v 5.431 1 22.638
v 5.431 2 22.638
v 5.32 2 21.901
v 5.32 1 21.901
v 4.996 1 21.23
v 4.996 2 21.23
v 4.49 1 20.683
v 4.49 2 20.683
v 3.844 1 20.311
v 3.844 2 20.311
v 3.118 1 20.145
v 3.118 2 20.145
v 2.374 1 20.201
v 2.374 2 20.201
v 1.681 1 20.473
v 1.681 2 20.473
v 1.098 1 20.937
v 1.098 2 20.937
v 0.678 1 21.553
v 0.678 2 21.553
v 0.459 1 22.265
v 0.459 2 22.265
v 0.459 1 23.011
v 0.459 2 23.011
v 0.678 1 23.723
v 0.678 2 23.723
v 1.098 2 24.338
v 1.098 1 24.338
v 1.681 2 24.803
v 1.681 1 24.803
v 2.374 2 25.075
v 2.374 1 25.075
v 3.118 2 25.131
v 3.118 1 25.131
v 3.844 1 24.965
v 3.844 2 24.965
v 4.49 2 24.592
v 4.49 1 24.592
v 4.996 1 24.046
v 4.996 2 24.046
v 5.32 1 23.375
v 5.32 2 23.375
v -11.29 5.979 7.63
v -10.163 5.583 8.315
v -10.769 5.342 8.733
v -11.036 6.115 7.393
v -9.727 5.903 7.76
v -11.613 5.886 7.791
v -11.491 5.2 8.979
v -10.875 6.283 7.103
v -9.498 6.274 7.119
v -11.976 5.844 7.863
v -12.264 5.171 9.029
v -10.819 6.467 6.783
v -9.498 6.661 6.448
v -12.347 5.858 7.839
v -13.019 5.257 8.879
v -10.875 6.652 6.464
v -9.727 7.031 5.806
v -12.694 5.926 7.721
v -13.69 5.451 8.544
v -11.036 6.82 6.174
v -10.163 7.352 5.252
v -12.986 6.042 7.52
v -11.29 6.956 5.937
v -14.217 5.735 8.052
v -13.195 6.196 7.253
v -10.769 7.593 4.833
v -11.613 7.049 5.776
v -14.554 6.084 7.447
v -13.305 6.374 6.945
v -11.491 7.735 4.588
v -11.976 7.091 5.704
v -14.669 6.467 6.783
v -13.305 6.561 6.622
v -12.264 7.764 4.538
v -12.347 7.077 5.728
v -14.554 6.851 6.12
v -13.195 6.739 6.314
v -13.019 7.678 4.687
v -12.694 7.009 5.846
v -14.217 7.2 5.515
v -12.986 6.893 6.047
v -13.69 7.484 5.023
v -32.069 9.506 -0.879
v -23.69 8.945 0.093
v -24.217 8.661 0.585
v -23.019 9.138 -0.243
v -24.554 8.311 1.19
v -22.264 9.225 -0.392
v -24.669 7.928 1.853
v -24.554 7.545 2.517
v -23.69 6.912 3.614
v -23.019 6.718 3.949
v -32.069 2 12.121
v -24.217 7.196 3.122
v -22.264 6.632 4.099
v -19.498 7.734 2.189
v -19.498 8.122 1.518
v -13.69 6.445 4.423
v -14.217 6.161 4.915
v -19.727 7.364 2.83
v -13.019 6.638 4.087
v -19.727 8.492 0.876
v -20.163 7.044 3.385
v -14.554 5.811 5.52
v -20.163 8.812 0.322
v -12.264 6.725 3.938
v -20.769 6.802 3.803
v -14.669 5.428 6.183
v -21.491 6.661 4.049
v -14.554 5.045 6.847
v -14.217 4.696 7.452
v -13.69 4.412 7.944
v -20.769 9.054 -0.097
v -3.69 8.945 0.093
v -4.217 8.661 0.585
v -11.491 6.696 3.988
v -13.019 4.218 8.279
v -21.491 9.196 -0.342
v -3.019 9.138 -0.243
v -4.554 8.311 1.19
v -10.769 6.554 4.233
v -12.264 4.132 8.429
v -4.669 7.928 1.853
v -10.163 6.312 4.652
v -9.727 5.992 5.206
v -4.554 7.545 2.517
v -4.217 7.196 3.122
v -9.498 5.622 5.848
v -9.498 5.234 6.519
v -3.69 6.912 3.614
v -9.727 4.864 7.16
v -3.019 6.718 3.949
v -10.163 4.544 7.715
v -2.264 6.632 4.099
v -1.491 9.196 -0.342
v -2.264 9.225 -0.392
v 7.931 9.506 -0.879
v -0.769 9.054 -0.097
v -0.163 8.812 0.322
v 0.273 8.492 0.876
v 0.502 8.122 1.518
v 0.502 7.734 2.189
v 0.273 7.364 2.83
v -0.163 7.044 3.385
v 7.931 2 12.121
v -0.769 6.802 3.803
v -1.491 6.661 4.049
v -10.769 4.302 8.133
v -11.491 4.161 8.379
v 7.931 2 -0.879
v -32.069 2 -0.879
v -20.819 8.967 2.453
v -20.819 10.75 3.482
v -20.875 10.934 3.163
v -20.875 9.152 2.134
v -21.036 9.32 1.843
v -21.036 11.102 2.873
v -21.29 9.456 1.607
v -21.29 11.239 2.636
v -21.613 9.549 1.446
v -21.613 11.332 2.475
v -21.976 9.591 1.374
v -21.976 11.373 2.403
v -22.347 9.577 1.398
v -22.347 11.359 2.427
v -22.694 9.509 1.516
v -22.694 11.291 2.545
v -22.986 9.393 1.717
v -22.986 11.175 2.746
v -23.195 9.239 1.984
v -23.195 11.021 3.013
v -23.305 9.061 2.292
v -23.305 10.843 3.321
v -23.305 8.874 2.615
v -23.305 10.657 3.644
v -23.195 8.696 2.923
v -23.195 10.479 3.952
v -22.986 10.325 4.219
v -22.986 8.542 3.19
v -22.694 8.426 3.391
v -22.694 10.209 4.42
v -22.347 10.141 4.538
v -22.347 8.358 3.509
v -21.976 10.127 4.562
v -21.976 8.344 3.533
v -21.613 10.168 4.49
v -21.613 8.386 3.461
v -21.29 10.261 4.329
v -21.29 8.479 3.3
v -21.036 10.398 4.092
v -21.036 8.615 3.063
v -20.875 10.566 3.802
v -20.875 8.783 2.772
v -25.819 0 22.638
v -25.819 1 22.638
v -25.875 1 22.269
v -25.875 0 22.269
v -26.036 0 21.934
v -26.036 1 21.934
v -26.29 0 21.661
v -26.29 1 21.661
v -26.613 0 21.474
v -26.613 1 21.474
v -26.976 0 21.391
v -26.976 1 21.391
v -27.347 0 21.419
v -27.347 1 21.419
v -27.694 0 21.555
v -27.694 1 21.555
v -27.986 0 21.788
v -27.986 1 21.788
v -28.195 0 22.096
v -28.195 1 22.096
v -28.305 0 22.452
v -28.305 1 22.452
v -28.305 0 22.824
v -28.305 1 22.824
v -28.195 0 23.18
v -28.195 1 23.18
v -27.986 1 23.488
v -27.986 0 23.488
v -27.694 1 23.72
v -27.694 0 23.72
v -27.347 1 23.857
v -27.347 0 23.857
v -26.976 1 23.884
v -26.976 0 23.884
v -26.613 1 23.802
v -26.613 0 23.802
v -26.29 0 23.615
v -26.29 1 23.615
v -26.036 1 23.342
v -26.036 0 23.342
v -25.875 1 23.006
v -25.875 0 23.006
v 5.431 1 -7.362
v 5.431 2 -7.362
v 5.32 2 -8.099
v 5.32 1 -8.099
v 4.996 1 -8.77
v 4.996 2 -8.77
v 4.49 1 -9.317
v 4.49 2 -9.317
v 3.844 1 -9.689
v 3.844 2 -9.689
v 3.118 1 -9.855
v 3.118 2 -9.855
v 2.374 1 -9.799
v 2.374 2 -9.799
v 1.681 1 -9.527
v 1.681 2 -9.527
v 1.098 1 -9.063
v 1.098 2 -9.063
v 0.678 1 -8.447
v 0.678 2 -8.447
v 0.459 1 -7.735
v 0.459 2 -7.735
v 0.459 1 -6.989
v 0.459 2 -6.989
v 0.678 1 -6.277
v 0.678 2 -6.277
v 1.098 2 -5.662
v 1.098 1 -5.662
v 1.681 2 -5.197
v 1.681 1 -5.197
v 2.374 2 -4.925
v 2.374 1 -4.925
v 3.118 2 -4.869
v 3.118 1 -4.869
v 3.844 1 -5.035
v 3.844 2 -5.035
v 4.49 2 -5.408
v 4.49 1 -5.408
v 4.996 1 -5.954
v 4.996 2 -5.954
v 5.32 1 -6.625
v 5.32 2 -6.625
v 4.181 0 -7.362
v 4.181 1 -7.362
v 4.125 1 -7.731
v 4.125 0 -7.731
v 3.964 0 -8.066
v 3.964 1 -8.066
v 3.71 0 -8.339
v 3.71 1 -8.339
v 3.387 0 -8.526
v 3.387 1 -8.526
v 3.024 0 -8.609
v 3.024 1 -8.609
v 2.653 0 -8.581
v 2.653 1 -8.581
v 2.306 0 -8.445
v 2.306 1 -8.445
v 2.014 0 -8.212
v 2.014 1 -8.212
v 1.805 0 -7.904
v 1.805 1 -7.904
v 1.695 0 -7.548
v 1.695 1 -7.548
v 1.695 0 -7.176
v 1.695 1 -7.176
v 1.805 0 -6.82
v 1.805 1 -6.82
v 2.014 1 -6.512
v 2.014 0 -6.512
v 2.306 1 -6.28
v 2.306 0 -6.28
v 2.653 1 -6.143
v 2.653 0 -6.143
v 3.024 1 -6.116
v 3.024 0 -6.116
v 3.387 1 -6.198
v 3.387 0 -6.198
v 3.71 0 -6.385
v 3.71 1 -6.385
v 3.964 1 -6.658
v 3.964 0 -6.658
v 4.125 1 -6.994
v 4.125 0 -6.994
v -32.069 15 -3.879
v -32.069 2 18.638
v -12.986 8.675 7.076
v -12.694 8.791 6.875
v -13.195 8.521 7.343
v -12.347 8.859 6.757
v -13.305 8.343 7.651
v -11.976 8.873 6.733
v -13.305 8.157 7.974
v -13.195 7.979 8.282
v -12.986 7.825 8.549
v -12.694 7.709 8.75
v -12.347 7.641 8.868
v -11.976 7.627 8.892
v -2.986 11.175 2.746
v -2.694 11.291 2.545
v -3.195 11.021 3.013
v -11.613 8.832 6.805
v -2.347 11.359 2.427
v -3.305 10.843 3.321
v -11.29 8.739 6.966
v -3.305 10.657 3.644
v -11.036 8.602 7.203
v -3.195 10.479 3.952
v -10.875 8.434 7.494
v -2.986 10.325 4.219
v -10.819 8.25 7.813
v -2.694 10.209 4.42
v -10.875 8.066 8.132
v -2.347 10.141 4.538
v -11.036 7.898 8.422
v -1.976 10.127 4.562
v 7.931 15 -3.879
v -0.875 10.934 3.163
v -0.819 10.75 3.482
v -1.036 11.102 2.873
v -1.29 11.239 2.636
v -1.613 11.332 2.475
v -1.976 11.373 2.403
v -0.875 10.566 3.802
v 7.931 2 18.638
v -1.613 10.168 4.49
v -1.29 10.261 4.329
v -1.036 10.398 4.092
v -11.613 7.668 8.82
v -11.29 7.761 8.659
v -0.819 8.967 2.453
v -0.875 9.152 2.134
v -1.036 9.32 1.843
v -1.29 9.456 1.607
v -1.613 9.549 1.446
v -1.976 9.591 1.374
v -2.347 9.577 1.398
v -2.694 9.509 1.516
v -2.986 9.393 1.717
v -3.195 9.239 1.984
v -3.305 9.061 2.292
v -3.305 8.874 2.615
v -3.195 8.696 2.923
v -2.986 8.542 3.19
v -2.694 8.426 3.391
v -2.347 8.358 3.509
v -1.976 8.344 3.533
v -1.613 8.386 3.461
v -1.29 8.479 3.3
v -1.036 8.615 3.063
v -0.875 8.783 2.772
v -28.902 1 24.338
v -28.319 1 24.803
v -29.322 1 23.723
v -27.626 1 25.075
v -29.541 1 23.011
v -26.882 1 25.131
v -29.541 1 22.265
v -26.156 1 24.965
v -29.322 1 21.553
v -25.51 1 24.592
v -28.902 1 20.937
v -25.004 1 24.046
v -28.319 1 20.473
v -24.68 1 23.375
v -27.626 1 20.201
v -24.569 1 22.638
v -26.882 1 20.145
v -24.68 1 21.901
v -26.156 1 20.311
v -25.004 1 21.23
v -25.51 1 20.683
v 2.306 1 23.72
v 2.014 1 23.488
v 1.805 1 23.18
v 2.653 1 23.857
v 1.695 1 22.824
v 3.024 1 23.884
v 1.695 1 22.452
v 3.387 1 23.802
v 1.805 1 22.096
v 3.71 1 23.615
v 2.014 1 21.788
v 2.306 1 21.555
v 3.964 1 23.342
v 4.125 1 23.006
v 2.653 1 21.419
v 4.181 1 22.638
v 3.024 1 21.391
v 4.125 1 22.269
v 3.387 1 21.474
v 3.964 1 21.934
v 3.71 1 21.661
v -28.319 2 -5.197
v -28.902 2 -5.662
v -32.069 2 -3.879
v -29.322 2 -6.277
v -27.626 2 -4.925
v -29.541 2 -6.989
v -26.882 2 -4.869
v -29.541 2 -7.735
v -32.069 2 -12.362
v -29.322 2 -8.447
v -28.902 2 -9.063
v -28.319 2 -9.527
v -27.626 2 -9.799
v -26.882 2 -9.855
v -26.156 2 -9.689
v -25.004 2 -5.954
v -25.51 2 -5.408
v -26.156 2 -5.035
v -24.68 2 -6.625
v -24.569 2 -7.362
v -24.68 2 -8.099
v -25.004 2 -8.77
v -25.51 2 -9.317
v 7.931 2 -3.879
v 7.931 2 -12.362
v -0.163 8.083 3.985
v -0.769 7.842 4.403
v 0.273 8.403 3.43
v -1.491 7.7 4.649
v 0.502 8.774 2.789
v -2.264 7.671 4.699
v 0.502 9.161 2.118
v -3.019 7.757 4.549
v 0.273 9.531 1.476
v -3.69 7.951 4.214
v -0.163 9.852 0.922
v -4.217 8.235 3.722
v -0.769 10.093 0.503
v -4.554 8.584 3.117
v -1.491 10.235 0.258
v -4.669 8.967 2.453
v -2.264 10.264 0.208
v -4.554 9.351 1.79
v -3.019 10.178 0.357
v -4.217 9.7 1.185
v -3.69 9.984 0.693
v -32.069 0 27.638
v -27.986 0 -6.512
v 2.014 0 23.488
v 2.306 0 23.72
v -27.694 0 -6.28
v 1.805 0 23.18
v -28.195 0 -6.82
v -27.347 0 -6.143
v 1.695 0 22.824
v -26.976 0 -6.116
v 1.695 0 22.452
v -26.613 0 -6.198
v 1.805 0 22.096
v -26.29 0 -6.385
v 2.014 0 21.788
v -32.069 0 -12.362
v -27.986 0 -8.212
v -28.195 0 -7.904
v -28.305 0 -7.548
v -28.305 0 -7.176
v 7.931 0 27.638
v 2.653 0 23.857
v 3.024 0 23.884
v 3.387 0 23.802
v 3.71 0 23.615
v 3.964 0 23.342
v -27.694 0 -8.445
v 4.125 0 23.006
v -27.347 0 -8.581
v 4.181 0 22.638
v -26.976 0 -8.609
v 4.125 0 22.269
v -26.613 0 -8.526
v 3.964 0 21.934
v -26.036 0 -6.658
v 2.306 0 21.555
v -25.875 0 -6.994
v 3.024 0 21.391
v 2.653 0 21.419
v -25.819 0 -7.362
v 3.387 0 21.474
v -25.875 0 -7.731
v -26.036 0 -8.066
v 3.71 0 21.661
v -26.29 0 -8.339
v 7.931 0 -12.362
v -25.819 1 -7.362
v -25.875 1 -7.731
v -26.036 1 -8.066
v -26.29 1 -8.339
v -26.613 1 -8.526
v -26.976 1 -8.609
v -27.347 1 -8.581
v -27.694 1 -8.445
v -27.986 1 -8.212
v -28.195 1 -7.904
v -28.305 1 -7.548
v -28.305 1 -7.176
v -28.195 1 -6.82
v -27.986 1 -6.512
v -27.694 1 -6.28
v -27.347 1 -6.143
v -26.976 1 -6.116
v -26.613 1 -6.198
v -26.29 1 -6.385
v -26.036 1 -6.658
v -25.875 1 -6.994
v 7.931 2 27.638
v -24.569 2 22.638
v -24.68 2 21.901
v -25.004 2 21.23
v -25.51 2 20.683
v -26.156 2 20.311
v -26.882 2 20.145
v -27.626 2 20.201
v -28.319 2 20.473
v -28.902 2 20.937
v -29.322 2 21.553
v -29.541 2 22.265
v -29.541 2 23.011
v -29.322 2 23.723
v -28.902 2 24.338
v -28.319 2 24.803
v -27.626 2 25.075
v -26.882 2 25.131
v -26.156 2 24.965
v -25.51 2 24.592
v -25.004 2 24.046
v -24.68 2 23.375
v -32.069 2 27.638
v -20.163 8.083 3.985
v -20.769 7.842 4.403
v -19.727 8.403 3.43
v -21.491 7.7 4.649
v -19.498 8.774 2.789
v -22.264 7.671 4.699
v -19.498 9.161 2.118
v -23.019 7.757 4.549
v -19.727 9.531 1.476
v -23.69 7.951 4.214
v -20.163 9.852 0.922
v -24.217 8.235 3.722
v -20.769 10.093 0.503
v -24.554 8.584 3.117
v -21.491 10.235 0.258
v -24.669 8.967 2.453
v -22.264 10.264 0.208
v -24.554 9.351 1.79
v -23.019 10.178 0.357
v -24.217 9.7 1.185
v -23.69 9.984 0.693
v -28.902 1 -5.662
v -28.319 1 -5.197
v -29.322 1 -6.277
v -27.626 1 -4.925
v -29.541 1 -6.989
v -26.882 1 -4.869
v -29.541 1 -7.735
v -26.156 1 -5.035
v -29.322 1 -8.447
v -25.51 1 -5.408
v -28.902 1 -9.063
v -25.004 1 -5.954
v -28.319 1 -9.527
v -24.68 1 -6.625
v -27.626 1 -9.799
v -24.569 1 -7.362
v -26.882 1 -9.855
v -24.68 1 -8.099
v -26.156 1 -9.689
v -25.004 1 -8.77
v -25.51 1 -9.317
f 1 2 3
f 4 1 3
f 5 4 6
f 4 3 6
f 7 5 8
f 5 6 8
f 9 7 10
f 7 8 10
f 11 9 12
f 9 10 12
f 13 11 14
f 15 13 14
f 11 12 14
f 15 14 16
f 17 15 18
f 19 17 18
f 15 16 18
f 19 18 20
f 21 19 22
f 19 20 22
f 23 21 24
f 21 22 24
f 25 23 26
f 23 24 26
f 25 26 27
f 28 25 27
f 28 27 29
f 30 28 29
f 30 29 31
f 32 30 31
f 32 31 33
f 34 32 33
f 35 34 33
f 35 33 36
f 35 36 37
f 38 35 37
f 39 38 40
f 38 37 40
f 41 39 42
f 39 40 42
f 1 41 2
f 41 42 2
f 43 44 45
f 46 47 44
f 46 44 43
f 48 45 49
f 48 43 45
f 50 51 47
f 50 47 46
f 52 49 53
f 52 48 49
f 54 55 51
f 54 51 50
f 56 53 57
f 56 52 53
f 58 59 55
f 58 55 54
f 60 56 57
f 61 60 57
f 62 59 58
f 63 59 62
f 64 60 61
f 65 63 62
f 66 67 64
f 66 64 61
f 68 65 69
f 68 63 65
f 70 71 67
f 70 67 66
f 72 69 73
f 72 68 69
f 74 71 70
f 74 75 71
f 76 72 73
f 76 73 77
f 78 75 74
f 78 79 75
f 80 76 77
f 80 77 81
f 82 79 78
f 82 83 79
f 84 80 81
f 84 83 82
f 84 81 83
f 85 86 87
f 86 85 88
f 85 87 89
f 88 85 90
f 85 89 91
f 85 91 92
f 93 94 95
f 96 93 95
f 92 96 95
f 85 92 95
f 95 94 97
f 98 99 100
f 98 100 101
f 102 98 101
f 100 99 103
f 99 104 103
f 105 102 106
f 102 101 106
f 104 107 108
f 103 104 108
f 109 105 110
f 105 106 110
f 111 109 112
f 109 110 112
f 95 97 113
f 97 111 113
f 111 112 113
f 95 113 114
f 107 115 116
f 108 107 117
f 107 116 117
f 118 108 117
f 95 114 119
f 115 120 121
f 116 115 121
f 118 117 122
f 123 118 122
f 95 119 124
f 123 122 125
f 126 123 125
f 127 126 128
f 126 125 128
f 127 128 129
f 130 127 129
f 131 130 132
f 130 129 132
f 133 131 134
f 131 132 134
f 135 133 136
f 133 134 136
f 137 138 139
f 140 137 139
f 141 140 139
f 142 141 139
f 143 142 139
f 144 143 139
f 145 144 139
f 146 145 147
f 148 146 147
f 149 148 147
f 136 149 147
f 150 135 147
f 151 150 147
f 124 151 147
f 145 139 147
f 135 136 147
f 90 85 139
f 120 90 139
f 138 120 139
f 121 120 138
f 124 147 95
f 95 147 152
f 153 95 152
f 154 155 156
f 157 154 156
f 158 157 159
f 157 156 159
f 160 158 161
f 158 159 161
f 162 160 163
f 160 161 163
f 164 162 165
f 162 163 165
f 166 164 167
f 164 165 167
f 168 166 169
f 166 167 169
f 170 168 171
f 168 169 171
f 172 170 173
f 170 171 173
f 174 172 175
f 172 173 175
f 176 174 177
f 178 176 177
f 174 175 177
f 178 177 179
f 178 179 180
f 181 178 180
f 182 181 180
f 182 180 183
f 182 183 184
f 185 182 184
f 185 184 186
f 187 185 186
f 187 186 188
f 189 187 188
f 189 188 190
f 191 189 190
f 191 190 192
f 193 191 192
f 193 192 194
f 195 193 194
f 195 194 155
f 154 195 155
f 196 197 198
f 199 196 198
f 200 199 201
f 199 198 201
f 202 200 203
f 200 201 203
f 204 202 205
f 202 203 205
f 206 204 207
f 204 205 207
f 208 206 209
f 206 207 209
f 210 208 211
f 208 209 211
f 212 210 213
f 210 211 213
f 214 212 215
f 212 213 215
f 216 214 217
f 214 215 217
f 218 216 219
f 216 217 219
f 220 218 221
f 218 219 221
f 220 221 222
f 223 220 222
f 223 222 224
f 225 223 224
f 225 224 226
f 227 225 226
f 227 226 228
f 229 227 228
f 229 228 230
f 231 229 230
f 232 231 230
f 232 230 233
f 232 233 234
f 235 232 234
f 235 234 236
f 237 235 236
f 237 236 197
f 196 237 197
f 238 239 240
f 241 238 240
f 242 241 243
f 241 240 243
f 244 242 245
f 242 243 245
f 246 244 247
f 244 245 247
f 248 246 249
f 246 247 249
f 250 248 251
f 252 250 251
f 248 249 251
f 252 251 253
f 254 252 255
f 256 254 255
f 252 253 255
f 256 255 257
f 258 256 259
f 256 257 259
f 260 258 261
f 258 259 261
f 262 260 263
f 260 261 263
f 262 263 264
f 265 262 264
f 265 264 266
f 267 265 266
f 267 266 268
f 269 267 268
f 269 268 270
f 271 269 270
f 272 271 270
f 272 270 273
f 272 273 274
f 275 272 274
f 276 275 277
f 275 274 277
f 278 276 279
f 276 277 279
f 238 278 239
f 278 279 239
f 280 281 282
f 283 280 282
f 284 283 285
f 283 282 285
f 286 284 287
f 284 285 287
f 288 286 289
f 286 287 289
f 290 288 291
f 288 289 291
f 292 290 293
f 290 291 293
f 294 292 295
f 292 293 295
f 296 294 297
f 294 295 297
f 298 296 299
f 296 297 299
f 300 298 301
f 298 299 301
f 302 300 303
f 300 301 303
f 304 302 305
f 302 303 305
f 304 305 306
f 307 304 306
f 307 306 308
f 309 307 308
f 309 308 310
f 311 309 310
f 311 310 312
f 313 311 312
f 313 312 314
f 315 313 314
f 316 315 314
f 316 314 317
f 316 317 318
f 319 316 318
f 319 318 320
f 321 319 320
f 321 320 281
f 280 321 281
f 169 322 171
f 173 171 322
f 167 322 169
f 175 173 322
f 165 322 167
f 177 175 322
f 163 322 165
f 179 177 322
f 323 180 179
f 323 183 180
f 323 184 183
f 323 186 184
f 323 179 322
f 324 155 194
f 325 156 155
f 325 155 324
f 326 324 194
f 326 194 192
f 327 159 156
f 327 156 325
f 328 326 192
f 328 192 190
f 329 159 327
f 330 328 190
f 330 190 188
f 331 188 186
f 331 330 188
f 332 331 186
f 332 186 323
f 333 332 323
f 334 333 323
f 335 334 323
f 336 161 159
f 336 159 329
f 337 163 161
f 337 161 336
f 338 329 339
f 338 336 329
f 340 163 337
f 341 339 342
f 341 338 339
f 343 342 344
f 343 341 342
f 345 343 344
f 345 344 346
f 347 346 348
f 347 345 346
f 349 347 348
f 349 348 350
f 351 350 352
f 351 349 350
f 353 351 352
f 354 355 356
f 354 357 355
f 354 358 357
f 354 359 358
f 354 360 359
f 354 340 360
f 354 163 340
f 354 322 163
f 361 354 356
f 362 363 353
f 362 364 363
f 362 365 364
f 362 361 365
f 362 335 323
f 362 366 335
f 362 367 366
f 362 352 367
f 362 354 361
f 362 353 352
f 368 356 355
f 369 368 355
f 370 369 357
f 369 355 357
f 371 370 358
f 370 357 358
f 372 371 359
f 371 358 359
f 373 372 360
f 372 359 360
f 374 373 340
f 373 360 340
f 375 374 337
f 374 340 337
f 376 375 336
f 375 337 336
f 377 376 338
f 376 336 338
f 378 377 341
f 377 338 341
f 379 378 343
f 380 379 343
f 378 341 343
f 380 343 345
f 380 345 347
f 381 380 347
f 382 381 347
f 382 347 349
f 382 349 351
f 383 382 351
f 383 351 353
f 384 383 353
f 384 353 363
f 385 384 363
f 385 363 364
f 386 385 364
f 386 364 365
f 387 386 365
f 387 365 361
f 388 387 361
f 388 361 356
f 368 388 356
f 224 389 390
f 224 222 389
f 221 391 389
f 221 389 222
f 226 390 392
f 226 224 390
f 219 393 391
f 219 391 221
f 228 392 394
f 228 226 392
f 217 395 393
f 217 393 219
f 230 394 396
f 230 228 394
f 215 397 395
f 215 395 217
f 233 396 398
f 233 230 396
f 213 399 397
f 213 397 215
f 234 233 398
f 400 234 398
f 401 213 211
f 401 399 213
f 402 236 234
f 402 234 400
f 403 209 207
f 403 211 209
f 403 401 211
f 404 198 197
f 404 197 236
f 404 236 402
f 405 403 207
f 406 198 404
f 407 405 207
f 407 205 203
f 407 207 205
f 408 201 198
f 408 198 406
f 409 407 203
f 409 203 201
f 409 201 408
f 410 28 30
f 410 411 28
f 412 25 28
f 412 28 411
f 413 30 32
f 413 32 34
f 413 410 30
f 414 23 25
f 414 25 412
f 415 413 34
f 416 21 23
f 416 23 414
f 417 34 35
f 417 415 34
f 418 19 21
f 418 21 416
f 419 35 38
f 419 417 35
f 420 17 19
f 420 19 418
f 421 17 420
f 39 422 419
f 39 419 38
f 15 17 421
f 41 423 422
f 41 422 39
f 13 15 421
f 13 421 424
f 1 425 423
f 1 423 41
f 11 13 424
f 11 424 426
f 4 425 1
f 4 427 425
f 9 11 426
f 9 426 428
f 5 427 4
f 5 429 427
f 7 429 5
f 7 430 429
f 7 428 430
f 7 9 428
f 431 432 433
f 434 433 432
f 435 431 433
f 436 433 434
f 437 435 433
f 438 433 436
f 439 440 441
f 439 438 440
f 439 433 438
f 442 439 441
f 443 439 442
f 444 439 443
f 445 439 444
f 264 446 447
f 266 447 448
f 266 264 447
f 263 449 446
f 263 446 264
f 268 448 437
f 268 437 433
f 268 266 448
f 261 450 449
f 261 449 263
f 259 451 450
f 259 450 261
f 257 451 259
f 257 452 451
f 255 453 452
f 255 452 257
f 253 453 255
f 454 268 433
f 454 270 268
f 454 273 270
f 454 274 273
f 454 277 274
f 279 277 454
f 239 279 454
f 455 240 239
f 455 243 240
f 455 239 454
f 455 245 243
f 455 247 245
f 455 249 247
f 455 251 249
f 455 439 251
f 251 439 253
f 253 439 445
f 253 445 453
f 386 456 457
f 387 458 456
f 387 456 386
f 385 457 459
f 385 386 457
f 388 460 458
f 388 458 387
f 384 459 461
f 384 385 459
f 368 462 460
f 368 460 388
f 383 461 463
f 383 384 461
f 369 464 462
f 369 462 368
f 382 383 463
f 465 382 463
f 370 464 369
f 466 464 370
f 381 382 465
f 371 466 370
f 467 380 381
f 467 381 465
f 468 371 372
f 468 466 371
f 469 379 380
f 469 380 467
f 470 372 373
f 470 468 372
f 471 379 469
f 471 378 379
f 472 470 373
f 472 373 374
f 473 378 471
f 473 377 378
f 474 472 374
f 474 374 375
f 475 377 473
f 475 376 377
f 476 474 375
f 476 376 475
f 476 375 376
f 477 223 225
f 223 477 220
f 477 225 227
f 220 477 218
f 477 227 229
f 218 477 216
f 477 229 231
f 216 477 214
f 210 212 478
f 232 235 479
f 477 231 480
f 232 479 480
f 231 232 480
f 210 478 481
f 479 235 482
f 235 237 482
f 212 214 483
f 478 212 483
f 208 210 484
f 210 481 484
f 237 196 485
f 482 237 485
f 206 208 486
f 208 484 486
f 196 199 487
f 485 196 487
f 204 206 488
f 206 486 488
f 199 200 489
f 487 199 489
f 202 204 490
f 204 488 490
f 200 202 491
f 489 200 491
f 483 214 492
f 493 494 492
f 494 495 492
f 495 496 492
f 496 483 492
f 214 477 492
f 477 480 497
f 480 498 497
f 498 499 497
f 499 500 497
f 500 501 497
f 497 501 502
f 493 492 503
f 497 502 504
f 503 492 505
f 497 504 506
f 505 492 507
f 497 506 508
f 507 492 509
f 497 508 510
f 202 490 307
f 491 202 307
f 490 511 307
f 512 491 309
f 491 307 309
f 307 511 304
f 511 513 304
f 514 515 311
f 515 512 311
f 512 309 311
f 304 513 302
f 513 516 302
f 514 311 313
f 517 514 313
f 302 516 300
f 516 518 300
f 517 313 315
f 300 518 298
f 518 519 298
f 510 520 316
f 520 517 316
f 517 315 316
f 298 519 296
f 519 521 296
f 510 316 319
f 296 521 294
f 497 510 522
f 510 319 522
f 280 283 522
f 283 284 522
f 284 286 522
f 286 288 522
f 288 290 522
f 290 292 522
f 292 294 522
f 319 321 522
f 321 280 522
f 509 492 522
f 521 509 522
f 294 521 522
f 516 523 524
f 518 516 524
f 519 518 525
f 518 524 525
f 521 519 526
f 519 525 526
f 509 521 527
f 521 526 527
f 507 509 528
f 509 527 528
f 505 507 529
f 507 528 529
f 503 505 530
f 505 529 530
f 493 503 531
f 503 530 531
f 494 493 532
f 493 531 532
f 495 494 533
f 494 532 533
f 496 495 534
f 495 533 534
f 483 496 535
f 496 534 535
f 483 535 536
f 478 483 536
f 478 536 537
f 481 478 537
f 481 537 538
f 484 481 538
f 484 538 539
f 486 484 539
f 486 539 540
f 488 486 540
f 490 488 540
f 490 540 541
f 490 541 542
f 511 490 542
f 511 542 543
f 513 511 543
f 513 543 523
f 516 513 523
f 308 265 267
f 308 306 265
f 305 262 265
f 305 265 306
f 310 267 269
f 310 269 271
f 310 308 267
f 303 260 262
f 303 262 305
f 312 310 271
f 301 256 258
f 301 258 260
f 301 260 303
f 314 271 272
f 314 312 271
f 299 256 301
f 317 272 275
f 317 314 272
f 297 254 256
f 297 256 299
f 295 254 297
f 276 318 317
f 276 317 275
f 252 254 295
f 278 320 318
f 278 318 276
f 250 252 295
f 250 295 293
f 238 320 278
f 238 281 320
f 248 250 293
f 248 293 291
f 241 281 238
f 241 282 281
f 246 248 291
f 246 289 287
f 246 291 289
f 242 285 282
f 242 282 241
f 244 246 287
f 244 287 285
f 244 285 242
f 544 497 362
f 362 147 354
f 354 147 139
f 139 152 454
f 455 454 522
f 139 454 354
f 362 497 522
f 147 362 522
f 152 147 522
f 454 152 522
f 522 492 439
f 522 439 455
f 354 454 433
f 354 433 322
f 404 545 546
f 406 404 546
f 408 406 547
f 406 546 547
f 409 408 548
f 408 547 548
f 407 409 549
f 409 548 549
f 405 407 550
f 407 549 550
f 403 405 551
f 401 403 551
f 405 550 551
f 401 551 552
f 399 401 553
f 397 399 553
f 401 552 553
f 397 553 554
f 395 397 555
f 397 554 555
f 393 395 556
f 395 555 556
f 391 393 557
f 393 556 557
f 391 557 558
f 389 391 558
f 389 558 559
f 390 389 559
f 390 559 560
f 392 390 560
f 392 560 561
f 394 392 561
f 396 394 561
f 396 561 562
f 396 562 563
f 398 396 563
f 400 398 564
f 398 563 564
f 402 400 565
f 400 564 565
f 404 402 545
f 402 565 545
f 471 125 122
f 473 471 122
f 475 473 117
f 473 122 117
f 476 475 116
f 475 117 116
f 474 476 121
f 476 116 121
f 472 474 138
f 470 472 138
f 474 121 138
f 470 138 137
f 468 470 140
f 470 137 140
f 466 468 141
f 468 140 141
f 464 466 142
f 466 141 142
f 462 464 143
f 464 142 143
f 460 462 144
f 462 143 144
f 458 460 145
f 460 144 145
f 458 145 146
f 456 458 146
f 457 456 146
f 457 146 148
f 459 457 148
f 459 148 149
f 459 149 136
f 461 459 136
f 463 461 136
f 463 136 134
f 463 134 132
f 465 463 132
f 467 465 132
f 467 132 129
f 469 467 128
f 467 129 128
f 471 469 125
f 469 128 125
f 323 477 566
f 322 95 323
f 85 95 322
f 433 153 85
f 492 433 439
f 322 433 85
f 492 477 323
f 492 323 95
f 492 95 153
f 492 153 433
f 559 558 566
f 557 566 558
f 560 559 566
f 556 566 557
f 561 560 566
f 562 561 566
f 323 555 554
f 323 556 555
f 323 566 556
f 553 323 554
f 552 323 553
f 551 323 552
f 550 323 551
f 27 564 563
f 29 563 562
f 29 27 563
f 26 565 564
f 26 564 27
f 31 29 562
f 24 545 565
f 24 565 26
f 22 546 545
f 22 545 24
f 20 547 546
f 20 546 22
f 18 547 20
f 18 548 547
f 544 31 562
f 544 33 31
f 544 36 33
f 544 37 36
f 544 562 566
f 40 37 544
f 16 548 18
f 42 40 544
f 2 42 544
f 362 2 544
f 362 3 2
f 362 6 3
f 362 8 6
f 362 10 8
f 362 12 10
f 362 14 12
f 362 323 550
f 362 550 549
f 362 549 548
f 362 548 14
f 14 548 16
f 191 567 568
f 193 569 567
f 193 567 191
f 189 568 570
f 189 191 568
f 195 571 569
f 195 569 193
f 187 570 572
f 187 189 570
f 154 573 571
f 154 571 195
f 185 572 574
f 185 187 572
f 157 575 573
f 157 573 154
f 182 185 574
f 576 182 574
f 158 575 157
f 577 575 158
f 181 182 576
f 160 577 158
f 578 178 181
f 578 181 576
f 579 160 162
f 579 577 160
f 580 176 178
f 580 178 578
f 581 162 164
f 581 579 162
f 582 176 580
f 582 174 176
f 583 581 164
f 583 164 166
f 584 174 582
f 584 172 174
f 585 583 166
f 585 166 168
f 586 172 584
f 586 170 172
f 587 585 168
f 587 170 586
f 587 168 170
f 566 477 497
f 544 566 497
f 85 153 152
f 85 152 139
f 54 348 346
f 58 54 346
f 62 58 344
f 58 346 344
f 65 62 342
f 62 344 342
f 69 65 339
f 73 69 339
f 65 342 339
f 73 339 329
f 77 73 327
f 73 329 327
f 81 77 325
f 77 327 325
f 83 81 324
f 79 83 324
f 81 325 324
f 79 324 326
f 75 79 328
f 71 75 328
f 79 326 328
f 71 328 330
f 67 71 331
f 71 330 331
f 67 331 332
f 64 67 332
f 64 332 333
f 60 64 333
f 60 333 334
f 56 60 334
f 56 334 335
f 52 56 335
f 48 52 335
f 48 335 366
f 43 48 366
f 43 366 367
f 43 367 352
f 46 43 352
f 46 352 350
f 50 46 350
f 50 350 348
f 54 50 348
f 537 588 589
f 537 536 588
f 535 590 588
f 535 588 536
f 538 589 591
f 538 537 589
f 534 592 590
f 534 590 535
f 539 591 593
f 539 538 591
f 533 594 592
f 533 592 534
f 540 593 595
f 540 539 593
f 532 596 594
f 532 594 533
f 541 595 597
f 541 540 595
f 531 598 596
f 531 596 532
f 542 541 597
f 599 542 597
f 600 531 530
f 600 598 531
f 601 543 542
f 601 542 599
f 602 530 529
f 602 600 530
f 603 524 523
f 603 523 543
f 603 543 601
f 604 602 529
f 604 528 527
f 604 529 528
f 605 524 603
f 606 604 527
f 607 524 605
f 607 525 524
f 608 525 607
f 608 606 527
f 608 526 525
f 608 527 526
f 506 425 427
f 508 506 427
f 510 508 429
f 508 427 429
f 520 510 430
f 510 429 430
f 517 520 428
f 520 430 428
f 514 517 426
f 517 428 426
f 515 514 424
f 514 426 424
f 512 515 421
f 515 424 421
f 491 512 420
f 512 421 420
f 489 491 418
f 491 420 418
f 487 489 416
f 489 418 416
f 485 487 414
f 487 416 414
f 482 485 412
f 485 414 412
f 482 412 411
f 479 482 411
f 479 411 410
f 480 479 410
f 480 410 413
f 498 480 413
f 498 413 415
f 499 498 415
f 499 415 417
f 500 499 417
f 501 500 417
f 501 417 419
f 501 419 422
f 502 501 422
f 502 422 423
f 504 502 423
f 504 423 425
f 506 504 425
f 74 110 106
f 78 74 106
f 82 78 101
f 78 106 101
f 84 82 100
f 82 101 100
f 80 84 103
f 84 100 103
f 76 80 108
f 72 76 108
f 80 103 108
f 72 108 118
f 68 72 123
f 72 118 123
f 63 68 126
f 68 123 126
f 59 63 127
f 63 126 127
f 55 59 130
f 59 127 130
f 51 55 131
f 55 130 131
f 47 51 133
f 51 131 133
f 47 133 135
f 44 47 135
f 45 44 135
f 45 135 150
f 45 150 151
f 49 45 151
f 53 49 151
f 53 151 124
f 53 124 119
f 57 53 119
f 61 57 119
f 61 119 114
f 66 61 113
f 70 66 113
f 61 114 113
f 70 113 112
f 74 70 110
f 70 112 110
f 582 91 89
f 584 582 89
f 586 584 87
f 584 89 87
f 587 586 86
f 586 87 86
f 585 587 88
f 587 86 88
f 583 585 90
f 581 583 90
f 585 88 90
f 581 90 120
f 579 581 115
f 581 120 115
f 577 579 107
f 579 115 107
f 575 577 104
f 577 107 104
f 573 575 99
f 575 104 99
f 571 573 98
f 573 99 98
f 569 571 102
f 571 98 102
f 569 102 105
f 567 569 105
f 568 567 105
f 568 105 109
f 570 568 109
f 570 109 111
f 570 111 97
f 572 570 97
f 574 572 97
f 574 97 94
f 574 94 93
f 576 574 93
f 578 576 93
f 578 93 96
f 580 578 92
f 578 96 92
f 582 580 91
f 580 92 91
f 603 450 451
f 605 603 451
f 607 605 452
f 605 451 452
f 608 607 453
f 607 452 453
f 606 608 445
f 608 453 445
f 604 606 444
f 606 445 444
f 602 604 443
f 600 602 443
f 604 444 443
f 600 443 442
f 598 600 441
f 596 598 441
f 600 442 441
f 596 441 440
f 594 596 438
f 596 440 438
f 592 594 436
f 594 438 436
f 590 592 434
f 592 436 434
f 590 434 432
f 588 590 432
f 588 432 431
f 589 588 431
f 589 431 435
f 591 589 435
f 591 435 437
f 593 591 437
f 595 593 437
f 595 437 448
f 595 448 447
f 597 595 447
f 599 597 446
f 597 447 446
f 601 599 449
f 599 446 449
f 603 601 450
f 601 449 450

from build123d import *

# Parameters (mm, degrees)
SKETCH1_W           = 40
SKETCH1_H           = 40
BOSS_EXTRUDE1_DEPTH = 2
SKETCH2_R           = 1.25
CUT_EXTRUDE1_DEPTH  = 3
BOSS_EXTRUDE2_DEPTH = 40
SKETCH5_R           = 2.5
CUT_EXTRUDE3_DEPTH  = 1
CUT_EXTRUDE4_DEPTH  = 41
CUT_EXTRUDE5_REACH  = 19.232
SKETCH6_R           = 1.25
SKETCH11_R          = 2.6
CUT_EXTRUDE6_DEPTH  = 1.2


with BuildPart() as part:
    # Sketch1 → Boss-Extrude1 (new body)
    with BuildSketch(Plane(origin=(0, 0, 0), x_dir=(1, 0, 0), z_dir=(0, 1, 0))):
        with Locations((-12.069207341, -7.637914169)):
            Rectangle(SKETCH1_W, SKETCH1_H)
    extrude(amount=BOSS_EXTRUDE1_DEPTH)

    # Sketch2 → Cut-Extrude1 (cut, through all)
    with BuildSketch(Plane(origin=(0, 2, 0), x_dir=(1, 0, 0), z_dir=(0, 1, 0))):
        with Locations((-27.069207341, -22.637914169)):
            Circle(SKETCH2_R)
        with Locations((-27.069207341, 7.362085831)):
            Circle(SKETCH2_R)
        with Locations((2.930792659, 7.362085831)):
            Circle(SKETCH2_R)
        with Locations((2.930792659, -22.637914169)):
            Circle(SKETCH2_R)
    extrude(amount=-CUT_EXTRUDE1_DEPTH, mode=Mode.SUBTRACT)

    # Sketch4 → Boss-Extrude2 (add)
    with BuildSketch(Plane(origin=(7.930792659, 0, 0), x_dir=(0, 0, -1), z_dir=(1, 0, 0))):
        Polygon((-18.637914169, 2), (3.878746329, 2), (3.878746329, 15), align=None)
    extrude(amount=-BOSS_EXTRUDE2_DEPTH)

    # Sketch5 → Cut-Extrude3 (cut)
    with BuildSketch(Plane(origin=(0, 2, 0), x_dir=(1, 0, 0), z_dir=(0, 1, 0))):
        with Locations((2.930792659, 7.362085831)):
            Circle(SKETCH5_R)
        with Locations((2.930792659, -22.637914169)):
            Circle(SKETCH5_R)
        with Locations((37.902040206, 5.850032714)):
            Circle(SKETCH5_R)
        with Locations((-27.069207341, 7.362085831)):
            Circle(SKETCH5_R)
        with Locations((-27.069207341, -22.637914169)):
            Circle(SKETCH5_R)
    extrude(amount=-CUT_EXTRUDE3_DEPTH, mode=Mode.SUBTRACT)

    # Sketch9 → Cut-Extrude4 (cut, through all)
    with BuildSketch(Plane(origin=(7.930792659, 0, 0), x_dir=(0, 0, -1), z_dir=(1, 0, 0))):
        Polygon((-12.121253671, 2), (0.878746329, 2), (0.878746329, 9.505553499), align=None)
    extrude(amount=-CUT_EXTRUDE4_DEPTH, mode=Mode.SUBTRACT)

    # Sketch6 → Cut-Extrude5 (cut, up to next)
    with BuildSketch(Plane(origin=(0, 9.570453572, 5.525503946), x_dir=(1, 0, 0), z_dir=(0, 0.866025404, 0.5)), mode=Mode.PRIVATE) as cut_extrude5_sk1:
        with Locations((-22.069207341, 2.359092856)):
            Circle(SKETCH6_R)
    cut_extrude5_tool1 = extrude(cut_extrude5_sk1.sketch, amount=-CUT_EXTRUDE5_REACH, mode=Mode.PRIVATE) & part.part
    add(cut_extrude5_tool1.solids().sort_by_distance((-22.069207, 10.75, 3.48247))[0], mode=Mode.SUBTRACT)
    # Sketch6 → Cut-Extrude5 (cut, up to next)
    with BuildSketch(Plane(origin=(0, 9.570453572, 5.525503946), x_dir=(1, 0, 0), z_dir=(0, 0.866025404, 0.5)), mode=Mode.PRIVATE) as cut_extrude5_sk2:
        with Locations((-12.069207341, -2.640907144)):
            Circle(SKETCH6_R)
    cut_extrude5_tool2 = extrude(cut_extrude5_sk2.sketch, amount=-CUT_EXTRUDE5_REACH, mode=Mode.PRIVATE) & part.part
    add(cut_extrude5_tool2.solids().sort_by_distance((-12.069207, 8.25, 7.812597))[0], mode=Mode.SUBTRACT)
    # Sketch6 → Cut-Extrude5 (cut, up to next)
    with BuildSketch(Plane(origin=(0, 9.570453572, 5.525503946), x_dir=(1, 0, 0), z_dir=(0, 0.866025404, 0.5)), mode=Mode.PRIVATE) as cut_extrude5_sk3:
        with Locations((-2.069207341, 2.359092856)):
            Circle(SKETCH6_R)
    cut_extrude5_tool3 = extrude(cut_extrude5_sk3.sketch, amount=-CUT_EXTRUDE5_REACH, mode=Mode.PRIVATE) & part.part
    add(cut_extrude5_tool3.solids().sort_by_distance((-2.069207, 10.75, 3.48247))[0], mode=Mode.SUBTRACT)

    # Sketch11 → Cut-Extrude6 (cut)
    with BuildSketch(Plane(origin=(0, 6.748656802, 3.896338821), x_dir=(-1, 0, 0), z_dir=(0, -0.866025404, -0.5))):
        with Locations((2.069207341, 2.359092856)):
            Circle(SKETCH11_R)
        with Locations((22.069207341, 2.359092856)):
            Circle(SKETCH11_R)
        with Locations((12.069207341, -2.640907144)):
            Circle(SKETCH11_R)
    extrude(amount=-CUT_EXTRUDE6_DEPTH, mode=Mode.SUBTRACT)


solid = part.part
